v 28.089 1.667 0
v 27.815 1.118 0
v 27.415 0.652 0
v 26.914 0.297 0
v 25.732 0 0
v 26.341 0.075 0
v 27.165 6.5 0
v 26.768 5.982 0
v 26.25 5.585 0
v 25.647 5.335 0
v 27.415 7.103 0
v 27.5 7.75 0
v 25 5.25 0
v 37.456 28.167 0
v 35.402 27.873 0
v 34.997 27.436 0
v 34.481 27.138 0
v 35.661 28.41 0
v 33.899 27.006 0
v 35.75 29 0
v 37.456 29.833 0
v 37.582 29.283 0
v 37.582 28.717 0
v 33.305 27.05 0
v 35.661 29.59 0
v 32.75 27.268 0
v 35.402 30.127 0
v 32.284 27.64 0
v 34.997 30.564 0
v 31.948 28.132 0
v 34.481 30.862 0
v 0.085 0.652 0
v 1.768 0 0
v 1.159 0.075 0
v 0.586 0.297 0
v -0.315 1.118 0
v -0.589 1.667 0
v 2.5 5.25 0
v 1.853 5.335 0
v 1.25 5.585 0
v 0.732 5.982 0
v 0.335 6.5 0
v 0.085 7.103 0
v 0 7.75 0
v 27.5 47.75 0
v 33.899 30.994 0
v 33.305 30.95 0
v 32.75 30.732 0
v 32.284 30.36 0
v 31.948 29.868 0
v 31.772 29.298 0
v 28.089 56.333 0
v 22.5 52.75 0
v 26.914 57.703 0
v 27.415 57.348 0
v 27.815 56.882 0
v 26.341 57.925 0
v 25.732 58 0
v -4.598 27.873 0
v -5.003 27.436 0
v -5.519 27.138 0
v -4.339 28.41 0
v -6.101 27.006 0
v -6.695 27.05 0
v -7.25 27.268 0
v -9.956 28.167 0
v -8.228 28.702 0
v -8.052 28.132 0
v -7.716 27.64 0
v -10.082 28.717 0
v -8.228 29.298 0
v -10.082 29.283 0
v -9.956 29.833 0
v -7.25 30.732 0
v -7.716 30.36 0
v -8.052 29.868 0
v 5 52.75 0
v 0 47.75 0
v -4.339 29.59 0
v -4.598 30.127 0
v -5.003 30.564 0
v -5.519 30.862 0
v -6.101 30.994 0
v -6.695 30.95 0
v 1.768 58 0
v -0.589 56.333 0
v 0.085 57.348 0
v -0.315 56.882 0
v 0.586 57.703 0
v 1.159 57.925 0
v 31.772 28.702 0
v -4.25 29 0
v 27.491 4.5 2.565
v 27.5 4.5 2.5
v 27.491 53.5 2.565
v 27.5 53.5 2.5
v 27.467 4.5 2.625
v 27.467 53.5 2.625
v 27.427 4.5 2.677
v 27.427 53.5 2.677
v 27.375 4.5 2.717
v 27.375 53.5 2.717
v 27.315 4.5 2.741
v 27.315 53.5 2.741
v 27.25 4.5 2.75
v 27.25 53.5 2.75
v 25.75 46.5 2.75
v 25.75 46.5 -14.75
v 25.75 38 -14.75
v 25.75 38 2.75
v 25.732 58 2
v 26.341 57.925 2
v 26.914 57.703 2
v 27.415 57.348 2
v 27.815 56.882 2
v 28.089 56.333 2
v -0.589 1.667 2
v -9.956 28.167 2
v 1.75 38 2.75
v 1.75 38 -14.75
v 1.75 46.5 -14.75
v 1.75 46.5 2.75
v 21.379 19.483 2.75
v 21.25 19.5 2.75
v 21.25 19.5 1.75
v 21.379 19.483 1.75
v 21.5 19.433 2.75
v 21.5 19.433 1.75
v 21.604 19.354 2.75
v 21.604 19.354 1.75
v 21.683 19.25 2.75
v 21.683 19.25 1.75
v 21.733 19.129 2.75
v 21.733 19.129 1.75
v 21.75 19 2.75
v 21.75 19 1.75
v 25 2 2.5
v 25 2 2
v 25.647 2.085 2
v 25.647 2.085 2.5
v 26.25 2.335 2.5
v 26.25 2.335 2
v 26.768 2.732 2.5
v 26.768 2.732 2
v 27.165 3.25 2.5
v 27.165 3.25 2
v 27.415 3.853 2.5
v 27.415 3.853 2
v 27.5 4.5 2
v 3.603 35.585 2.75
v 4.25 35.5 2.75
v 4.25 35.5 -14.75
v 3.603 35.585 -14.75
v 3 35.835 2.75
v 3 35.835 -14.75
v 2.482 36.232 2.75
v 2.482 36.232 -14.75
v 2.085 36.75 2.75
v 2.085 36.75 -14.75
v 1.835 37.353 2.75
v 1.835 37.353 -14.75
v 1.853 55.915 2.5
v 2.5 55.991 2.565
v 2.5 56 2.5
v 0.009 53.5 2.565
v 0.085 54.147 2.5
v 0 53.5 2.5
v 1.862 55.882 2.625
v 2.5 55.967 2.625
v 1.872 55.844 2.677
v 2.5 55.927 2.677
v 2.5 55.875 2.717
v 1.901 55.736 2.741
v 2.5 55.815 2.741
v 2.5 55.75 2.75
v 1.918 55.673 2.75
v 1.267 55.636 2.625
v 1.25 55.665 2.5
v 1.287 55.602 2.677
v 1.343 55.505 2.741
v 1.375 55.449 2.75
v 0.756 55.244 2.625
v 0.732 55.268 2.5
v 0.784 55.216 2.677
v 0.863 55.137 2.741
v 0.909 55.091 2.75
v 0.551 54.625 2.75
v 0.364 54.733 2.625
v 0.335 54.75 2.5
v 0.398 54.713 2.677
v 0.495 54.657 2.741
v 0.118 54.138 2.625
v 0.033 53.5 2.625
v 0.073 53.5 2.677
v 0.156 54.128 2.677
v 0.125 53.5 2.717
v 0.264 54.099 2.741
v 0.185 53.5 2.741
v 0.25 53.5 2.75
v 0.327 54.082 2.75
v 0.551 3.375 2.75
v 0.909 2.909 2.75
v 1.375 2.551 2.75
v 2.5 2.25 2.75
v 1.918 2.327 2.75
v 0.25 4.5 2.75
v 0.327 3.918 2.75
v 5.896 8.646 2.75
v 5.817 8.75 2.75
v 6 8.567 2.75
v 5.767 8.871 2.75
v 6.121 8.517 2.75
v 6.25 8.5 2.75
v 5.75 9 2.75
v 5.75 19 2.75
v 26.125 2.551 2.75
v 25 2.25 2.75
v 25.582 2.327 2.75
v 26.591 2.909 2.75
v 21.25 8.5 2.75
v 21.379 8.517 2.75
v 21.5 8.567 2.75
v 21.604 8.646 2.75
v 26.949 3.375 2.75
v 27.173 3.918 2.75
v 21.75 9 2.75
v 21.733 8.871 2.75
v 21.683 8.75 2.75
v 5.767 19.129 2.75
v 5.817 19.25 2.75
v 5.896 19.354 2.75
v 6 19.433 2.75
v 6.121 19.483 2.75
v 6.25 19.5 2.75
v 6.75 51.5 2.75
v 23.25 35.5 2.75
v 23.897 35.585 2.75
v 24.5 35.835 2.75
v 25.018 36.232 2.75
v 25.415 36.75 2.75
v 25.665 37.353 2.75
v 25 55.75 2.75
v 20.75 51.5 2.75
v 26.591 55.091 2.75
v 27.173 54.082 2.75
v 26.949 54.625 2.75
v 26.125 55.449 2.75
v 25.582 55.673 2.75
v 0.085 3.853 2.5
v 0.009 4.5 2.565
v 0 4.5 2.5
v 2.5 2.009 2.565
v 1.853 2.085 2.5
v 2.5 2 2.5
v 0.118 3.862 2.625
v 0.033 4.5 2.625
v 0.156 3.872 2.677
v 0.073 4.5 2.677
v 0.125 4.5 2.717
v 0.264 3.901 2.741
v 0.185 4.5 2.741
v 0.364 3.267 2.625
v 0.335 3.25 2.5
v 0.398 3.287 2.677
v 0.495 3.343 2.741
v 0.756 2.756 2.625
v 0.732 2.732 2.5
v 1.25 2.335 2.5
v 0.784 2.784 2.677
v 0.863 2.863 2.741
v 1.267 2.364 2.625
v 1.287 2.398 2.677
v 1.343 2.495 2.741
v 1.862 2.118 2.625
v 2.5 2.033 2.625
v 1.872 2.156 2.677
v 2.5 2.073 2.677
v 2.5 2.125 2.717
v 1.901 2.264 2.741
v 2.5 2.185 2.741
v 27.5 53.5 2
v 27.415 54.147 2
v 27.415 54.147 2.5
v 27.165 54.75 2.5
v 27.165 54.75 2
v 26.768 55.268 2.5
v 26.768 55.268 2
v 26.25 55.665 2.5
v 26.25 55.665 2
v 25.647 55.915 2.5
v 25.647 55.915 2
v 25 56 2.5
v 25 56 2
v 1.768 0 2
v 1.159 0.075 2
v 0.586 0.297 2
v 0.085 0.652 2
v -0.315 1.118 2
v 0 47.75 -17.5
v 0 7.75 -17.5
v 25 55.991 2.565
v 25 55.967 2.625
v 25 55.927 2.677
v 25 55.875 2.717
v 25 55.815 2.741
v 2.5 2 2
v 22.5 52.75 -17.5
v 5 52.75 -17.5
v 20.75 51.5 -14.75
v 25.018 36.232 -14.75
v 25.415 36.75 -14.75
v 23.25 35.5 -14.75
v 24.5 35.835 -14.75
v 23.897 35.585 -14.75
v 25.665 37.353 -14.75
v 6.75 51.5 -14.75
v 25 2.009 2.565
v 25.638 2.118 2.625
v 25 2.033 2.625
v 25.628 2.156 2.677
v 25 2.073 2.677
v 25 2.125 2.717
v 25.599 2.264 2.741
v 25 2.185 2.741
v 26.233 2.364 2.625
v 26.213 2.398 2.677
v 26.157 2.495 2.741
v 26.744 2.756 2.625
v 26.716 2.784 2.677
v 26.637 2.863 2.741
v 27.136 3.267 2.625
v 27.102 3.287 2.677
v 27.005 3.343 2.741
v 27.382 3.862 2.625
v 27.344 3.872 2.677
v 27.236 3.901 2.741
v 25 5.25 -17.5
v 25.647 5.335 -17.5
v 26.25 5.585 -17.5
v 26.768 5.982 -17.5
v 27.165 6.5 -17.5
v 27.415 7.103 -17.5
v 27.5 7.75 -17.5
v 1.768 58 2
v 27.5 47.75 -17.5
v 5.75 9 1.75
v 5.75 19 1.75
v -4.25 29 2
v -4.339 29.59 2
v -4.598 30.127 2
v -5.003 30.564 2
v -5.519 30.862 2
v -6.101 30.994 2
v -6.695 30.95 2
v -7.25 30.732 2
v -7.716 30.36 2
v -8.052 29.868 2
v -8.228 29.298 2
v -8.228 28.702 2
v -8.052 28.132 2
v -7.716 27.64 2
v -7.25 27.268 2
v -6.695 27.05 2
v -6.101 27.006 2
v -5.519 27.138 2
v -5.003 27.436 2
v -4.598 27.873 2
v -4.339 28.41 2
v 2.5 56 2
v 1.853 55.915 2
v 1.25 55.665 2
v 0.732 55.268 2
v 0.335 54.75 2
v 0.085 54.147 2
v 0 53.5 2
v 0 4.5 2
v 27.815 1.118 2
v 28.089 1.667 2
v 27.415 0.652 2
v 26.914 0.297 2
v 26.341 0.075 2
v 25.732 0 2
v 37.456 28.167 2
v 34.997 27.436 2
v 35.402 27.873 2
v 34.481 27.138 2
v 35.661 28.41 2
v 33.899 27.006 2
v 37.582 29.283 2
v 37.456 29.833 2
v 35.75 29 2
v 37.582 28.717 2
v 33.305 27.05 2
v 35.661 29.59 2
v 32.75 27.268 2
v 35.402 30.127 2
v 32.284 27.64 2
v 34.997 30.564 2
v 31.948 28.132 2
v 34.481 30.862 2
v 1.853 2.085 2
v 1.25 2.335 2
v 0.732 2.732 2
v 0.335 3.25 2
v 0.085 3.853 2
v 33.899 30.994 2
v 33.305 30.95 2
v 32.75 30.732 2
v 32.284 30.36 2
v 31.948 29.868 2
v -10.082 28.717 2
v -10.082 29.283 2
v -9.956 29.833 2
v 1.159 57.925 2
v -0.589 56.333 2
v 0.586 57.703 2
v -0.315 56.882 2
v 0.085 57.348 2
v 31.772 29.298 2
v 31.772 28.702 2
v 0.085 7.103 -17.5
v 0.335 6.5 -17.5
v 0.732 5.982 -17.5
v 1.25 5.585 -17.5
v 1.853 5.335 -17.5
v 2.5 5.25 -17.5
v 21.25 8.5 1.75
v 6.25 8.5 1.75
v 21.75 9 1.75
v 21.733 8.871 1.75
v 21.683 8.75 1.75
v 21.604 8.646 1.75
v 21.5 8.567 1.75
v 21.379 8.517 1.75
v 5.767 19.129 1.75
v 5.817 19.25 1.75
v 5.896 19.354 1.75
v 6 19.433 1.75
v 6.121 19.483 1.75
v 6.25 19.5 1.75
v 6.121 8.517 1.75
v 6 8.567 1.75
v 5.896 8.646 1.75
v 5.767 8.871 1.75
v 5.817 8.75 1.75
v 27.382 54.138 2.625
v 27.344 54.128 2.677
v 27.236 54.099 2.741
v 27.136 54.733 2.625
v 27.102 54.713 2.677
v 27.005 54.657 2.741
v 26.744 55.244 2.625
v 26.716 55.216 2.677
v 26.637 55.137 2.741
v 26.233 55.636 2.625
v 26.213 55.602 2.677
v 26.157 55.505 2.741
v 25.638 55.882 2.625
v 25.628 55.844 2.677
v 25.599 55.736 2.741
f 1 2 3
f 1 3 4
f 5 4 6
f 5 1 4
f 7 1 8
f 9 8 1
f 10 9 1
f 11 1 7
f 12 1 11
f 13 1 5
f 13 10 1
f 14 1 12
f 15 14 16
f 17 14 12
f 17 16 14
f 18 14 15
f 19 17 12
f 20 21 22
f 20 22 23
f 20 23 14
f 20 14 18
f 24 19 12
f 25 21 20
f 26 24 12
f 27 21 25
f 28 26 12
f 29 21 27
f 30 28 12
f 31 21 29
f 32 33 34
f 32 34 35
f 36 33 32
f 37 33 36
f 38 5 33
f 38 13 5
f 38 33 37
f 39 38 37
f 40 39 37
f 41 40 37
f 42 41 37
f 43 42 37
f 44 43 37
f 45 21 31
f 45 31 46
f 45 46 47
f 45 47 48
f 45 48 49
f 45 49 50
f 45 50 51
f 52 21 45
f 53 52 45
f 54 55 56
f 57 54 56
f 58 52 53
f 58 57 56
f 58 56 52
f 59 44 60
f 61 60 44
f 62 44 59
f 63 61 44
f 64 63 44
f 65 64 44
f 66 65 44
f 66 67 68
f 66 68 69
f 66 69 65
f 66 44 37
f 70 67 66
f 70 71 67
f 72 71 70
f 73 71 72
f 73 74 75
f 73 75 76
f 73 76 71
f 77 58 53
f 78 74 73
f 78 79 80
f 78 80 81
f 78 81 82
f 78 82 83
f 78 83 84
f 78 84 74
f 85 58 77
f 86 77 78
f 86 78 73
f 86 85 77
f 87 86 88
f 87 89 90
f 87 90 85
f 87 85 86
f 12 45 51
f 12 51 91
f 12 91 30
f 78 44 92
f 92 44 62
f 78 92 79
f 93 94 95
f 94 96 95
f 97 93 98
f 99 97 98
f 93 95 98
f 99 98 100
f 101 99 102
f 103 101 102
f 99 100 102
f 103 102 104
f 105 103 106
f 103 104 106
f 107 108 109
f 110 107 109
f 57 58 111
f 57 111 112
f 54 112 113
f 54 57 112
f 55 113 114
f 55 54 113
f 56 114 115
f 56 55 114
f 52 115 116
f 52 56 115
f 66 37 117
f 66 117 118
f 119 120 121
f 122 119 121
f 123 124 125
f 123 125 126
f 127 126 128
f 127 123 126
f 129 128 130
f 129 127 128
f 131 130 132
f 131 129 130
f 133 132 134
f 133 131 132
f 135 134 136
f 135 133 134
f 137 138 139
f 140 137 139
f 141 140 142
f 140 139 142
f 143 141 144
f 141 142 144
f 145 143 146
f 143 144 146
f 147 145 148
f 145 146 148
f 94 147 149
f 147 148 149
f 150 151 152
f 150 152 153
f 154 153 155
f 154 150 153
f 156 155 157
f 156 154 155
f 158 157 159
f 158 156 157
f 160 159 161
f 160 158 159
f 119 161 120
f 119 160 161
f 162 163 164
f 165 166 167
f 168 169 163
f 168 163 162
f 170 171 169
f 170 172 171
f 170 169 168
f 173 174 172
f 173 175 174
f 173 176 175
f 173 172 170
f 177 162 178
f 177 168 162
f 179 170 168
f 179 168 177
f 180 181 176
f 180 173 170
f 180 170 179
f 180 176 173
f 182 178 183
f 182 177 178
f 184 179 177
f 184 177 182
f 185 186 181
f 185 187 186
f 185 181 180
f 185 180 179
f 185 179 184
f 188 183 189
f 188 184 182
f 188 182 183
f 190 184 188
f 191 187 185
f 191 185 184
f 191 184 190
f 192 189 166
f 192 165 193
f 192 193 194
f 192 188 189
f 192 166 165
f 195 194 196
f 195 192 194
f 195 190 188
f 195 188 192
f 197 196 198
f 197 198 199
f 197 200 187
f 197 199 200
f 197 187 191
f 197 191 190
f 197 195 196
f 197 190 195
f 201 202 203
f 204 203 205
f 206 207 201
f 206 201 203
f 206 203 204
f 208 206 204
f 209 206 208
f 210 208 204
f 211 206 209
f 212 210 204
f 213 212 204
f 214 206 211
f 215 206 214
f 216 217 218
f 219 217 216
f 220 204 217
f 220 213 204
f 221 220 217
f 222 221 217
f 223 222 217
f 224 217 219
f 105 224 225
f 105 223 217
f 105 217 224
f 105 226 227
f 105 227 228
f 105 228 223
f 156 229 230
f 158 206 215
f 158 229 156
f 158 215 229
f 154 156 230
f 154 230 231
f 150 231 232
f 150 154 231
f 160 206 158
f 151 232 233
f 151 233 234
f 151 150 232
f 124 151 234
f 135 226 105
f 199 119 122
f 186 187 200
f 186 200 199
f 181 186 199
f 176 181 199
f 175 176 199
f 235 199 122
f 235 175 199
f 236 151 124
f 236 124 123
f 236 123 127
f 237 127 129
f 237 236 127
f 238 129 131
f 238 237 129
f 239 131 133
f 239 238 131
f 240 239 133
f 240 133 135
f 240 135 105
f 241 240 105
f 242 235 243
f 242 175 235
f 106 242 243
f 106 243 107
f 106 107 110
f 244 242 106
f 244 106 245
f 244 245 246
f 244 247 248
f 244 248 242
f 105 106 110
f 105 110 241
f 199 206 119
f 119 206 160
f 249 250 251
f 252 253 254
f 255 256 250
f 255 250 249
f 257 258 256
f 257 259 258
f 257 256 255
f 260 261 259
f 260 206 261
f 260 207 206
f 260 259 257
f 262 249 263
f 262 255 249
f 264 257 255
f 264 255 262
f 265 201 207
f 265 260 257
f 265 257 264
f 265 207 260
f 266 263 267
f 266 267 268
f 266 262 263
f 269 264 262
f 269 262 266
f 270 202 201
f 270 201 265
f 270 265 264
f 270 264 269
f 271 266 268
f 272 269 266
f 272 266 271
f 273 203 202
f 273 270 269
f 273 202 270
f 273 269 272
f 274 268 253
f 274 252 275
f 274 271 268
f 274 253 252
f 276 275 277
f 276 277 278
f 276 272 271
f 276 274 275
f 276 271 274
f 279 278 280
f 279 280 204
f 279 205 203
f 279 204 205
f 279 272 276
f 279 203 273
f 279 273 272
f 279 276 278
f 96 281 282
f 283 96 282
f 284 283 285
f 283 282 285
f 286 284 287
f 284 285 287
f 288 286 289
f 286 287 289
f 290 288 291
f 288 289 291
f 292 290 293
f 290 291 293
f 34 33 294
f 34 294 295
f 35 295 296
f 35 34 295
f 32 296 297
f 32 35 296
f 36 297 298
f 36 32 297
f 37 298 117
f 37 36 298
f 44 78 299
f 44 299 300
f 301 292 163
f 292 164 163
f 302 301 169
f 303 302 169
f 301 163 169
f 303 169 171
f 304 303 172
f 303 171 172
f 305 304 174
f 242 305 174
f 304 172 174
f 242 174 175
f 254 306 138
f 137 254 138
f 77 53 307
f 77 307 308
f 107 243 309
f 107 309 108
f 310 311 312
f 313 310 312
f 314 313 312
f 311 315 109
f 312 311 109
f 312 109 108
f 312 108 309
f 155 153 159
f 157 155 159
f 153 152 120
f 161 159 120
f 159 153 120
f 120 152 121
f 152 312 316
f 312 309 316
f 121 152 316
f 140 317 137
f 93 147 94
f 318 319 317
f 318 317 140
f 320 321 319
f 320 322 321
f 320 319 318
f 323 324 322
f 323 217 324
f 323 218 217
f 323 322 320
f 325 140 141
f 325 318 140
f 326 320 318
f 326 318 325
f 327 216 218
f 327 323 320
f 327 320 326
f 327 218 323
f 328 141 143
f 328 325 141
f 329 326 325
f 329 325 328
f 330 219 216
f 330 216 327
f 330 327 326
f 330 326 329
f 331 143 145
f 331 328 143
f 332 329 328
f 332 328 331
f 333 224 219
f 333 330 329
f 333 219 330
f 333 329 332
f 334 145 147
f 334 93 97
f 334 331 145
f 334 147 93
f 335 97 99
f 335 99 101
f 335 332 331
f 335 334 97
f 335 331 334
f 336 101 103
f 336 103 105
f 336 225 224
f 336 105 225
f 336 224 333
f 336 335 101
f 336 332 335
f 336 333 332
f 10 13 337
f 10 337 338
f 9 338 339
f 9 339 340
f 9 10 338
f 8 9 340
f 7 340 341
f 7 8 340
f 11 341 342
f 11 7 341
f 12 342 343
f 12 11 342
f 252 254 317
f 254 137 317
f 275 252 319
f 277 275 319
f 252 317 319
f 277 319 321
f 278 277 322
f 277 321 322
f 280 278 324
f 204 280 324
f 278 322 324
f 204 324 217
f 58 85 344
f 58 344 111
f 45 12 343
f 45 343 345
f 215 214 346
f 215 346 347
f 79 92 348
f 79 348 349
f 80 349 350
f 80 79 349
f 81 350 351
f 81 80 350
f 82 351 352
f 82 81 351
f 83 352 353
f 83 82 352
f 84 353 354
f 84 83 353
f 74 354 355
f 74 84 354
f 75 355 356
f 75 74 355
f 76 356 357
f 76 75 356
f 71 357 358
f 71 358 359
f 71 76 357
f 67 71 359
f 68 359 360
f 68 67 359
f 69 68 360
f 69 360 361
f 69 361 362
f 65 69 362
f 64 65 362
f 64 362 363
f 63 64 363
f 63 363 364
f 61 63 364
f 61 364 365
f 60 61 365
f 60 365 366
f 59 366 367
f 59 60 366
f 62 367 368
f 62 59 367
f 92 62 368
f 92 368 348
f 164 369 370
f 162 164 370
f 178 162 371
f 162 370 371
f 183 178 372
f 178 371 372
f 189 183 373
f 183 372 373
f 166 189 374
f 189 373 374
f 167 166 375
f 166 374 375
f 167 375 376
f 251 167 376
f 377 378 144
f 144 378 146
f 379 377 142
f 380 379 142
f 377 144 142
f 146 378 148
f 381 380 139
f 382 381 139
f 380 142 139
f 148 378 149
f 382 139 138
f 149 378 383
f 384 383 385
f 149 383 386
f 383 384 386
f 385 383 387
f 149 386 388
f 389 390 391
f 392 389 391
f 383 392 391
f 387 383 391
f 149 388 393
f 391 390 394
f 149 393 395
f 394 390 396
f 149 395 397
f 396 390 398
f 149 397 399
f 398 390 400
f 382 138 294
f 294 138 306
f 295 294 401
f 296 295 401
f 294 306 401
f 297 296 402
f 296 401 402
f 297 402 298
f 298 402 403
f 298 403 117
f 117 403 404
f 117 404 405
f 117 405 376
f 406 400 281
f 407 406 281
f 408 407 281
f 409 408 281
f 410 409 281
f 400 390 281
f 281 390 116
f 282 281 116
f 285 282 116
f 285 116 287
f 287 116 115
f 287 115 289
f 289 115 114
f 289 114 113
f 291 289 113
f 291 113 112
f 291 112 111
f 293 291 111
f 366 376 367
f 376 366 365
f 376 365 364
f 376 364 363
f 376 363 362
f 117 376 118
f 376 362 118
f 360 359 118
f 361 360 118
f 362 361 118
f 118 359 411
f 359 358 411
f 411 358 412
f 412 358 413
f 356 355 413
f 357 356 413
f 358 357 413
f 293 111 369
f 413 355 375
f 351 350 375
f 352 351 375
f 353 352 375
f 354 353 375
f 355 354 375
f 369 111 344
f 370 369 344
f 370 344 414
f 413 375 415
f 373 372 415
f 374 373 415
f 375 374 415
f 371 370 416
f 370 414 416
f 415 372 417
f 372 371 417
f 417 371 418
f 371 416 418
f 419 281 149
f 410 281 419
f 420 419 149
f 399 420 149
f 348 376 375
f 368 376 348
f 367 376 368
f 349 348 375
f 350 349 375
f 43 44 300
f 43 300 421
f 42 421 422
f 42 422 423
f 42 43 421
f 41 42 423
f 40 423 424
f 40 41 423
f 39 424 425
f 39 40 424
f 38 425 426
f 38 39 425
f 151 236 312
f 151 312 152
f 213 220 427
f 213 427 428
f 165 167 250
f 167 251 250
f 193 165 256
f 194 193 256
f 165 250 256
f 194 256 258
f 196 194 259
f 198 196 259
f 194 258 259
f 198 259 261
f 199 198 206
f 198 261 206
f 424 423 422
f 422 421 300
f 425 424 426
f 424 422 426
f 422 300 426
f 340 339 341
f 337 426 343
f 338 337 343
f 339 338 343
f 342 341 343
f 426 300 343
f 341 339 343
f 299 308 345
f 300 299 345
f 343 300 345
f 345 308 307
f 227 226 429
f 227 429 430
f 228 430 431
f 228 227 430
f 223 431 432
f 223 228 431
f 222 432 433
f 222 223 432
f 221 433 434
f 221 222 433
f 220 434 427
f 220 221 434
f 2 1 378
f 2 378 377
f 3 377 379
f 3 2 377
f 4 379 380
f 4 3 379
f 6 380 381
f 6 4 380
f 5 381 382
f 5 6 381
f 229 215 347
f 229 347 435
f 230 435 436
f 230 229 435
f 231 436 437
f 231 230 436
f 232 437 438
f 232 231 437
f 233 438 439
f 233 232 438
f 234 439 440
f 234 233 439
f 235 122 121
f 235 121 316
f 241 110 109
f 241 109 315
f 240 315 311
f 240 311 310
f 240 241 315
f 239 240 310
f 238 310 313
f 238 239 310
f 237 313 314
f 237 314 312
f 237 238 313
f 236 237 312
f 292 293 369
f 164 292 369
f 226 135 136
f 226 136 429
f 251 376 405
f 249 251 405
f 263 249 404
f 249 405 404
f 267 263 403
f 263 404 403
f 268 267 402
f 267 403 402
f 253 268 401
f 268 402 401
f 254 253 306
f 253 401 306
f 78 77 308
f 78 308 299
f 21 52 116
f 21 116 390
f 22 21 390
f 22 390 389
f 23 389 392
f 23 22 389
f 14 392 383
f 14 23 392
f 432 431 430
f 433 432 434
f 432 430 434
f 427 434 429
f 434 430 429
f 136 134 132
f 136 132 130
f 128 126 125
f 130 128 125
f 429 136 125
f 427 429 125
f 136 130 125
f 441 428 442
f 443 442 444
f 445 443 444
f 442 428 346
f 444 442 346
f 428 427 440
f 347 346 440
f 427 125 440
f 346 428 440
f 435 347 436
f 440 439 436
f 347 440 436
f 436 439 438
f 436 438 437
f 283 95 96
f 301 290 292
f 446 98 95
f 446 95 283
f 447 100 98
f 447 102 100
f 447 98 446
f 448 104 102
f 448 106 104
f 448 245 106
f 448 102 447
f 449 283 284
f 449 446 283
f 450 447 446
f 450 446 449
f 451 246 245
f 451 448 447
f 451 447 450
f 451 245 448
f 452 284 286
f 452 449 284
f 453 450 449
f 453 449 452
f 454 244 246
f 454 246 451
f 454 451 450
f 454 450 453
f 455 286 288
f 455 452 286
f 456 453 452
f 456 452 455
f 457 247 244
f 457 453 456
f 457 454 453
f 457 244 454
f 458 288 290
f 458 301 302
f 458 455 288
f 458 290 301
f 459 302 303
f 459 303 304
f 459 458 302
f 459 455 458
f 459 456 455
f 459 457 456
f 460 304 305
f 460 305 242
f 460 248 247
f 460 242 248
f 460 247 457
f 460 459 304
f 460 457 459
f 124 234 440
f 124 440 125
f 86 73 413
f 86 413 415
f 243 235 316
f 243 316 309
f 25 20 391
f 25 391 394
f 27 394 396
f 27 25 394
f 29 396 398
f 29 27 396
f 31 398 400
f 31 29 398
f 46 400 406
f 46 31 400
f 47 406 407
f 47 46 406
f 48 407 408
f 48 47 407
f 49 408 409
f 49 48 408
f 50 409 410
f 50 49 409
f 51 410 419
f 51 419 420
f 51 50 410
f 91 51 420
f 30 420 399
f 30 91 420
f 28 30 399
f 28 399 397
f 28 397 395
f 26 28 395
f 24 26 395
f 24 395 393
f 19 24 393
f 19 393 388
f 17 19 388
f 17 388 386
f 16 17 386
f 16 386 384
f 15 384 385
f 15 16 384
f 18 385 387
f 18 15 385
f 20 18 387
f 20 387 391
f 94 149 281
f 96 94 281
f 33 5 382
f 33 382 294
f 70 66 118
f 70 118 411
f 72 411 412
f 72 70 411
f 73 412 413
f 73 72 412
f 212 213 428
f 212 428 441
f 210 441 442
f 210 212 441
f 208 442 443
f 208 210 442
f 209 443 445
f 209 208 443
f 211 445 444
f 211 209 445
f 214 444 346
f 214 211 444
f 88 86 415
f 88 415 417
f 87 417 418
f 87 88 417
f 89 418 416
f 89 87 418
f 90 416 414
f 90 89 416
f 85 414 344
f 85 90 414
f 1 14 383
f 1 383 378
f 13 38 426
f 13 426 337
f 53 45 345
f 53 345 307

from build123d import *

# Parameters (mm, degrees)
SKETCH1_R           = 2
BOSS_EXTRUDE1_DEPTH = 2
BOSS_EXTRUDE2_DEPTH = 0.75
FILLET1_R           = 0.25
BOSS_EXTRUDE3_DEPTH = 17.5
CUT_EXTRUDE1_DEPTH  = 17.5
CUT_EXTRUDE2_DEPTH  = 1


with BuildPart() as part:
    # Sketch1 → Boss-Extrude1 (new body)
    with BuildSketch(Plane.XY):
        with BuildLine():
            Line((28.089158303, 56.333113093), (37.455537614, 29.833113093))
            ThreePointArc((37.455537614, 29.833113093), (37.598437155, 29), (37.455537614, 28.166886907))
            Line((37.455537614, 28.166886907), (28.089158303, 1.666886907))
            ThreePointArc((28.089158303, 1.666886907), (27.175528881, 0.458825983), (25.732057844, 0))
            Line((25.732057844, 0), (1.767942156, 0))
            ThreePointArc((1.767942156, 0), (0.324471119, 0.458825983), (-0.589158303, 1.666886907))
            Line((-0.589158303, 1.666886907), (-9.955537614, 28.166886907))
            ThreePointArc((-9.955537614, 28.166886907), (-10.098437155, 29), (-9.955537614, 29.833113093))
            Line((-9.955537614, 29.833113093), (-0.589158303, 56.333113093))
            ThreePointArc((-0.589158303, 56.333113093), (0.324471119, 57.541174017), (1.767942156, 58))
            Line((1.767942156, 58), (25.732057844, 58))
            ThreePointArc((25.732057844, 58), (27.175528881, 57.541174017), (28.089158303, 56.333113093))
        make_face()
        with Locations((-6.25, 29)):
            Circle(SKETCH1_R, mode=Mode.SUBTRACT)
        with Locations((33.75, 29)):
            Circle(SKETCH1_R, mode=Mode.SUBTRACT)
    extrude(amount=BOSS_EXTRUDE1_DEPTH)

    # Sketch2 → Boss-Extrude2 (add)
    with BuildSketch(Plane.XY.offset(2)):
        with BuildLine():
            Line((2.5, 2), (25, 2))
            ThreePointArc((25, 2), (26.767766953, 2.732233047), (27.5, 4.5))
            Line((27.5, 4.5), (27.5, 53.5))
            ThreePointArc((27.5, 53.5), (26.767766953, 55.267766953), (25, 56))
            Line((25, 56), (2.5, 56))
            ThreePointArc((2.5, 56), (0.732233047, 55.267766953), (0, 53.5))
            Line((0, 53.5), (0, 4.5))
            ThreePointArc((0, 4.5), (0.732233047, 2.732233047), (2.5, 2))
        make_face()
    extrude(amount=BOSS_EXTRUDE2_DEPTH)

    # Fillet1
    fillet1_edges = [part.edges().sort_by_distance(p)[0] for p in [
        (0.732233047, 2.732233047, 2.75),
        (13.75, 2, 2.75),
        (26.767766953, 2.732233047, 2.75),
        (27.5, 29, 2.75),
        (26.767766953, 55.267766953, 2.75),
        (13.75, 56, 2.75),
        (0.732233047, 55.267766953, 2.75),
        (0, 29, 2.75),
    ]]
    fillet(fillet1_edges, radius=FILLET1_R)

    # Sketch3 → Boss-Extrude3 (add)
    with BuildSketch(Plane(origin=(0, 0, 0), x_dir=(-1, 0, 0), z_dir=(0, 0, -1))):
        with BuildLine():
            Line((-27.5, 47.75), (-22.5, 52.75))
            Line((-22.5, 52.75), (-5, 52.75))
            Line((-5, 52.75), (0, 47.75))
            Line((0, 47.75), (0, 7.75))
            ThreePointArc((0, 7.75), (-0.732233047, 5.982233047), (-2.5, 5.25))
            Line((-2.5, 5.25), (-25, 5.25))
            ThreePointArc((-25, 5.25), (-26.767766953, 5.982233047), (-27.5, 7.75))
            Line((-27.5, 7.75), (-27.5, 47.75))
        make_face()
    extrude(amount=BOSS_EXTRUDE3_DEPTH)

    # Sketch4 → Cut-Extrude1 (cut)
    with BuildSketch(Plane.XY.offset(2.75)):
        with BuildLine():
            Line((1.75, 46.5), (6.75, 51.5))
            Line((6.75, 51.5), (20.75, 51.5))
            Line((20.75, 51.5), (25.75, 46.5))
            Line((25.75, 46.5), (25.75, 38))
            ThreePointArc((25.75, 38), (25.017766953, 36.232233047), (23.25, 35.5))
            Line((23.25, 35.5), (4.25, 35.5))
            ThreePointArc((4.25, 35.5), (2.482233047, 36.232233047), (1.75, 38))
            Line((1.75, 38), (1.75, 46.5))
        make_face()
    extrude(amount=-CUT_EXTRUDE1_DEPTH, mode=Mode.SUBTRACT)

    # Sketch5 → Cut-Extrude2 (cut)
    with BuildSketch(Plane.XY.offset(2.75)):
        with BuildLine():
            Line((6.25, 19.5), (21.25, 19.5))
            ThreePointArc((21.25, 19.5), (21.603553391, 19.353553391), (21.75, 19))
            Line((21.75, 19), (21.75, 9))
            ThreePointArc((21.75, 9), (21.603553391, 8.646446609), (21.25, 8.5))
            Line((21.25, 8.5), (6.25, 8.5))
            ThreePointArc((6.25, 8.5), (5.896446609, 8.646446609), (5.75, 9))
            Line((5.75, 9), (5.75, 19))
            ThreePointArc((5.75, 19), (5.896446609, 19.353553391), (6.25, 19.5))
        make_face()
    extrude(amount=-CUT_EXTRUDE2_DEPTH, mode=Mode.SUBTRACT)


solid = part.part
